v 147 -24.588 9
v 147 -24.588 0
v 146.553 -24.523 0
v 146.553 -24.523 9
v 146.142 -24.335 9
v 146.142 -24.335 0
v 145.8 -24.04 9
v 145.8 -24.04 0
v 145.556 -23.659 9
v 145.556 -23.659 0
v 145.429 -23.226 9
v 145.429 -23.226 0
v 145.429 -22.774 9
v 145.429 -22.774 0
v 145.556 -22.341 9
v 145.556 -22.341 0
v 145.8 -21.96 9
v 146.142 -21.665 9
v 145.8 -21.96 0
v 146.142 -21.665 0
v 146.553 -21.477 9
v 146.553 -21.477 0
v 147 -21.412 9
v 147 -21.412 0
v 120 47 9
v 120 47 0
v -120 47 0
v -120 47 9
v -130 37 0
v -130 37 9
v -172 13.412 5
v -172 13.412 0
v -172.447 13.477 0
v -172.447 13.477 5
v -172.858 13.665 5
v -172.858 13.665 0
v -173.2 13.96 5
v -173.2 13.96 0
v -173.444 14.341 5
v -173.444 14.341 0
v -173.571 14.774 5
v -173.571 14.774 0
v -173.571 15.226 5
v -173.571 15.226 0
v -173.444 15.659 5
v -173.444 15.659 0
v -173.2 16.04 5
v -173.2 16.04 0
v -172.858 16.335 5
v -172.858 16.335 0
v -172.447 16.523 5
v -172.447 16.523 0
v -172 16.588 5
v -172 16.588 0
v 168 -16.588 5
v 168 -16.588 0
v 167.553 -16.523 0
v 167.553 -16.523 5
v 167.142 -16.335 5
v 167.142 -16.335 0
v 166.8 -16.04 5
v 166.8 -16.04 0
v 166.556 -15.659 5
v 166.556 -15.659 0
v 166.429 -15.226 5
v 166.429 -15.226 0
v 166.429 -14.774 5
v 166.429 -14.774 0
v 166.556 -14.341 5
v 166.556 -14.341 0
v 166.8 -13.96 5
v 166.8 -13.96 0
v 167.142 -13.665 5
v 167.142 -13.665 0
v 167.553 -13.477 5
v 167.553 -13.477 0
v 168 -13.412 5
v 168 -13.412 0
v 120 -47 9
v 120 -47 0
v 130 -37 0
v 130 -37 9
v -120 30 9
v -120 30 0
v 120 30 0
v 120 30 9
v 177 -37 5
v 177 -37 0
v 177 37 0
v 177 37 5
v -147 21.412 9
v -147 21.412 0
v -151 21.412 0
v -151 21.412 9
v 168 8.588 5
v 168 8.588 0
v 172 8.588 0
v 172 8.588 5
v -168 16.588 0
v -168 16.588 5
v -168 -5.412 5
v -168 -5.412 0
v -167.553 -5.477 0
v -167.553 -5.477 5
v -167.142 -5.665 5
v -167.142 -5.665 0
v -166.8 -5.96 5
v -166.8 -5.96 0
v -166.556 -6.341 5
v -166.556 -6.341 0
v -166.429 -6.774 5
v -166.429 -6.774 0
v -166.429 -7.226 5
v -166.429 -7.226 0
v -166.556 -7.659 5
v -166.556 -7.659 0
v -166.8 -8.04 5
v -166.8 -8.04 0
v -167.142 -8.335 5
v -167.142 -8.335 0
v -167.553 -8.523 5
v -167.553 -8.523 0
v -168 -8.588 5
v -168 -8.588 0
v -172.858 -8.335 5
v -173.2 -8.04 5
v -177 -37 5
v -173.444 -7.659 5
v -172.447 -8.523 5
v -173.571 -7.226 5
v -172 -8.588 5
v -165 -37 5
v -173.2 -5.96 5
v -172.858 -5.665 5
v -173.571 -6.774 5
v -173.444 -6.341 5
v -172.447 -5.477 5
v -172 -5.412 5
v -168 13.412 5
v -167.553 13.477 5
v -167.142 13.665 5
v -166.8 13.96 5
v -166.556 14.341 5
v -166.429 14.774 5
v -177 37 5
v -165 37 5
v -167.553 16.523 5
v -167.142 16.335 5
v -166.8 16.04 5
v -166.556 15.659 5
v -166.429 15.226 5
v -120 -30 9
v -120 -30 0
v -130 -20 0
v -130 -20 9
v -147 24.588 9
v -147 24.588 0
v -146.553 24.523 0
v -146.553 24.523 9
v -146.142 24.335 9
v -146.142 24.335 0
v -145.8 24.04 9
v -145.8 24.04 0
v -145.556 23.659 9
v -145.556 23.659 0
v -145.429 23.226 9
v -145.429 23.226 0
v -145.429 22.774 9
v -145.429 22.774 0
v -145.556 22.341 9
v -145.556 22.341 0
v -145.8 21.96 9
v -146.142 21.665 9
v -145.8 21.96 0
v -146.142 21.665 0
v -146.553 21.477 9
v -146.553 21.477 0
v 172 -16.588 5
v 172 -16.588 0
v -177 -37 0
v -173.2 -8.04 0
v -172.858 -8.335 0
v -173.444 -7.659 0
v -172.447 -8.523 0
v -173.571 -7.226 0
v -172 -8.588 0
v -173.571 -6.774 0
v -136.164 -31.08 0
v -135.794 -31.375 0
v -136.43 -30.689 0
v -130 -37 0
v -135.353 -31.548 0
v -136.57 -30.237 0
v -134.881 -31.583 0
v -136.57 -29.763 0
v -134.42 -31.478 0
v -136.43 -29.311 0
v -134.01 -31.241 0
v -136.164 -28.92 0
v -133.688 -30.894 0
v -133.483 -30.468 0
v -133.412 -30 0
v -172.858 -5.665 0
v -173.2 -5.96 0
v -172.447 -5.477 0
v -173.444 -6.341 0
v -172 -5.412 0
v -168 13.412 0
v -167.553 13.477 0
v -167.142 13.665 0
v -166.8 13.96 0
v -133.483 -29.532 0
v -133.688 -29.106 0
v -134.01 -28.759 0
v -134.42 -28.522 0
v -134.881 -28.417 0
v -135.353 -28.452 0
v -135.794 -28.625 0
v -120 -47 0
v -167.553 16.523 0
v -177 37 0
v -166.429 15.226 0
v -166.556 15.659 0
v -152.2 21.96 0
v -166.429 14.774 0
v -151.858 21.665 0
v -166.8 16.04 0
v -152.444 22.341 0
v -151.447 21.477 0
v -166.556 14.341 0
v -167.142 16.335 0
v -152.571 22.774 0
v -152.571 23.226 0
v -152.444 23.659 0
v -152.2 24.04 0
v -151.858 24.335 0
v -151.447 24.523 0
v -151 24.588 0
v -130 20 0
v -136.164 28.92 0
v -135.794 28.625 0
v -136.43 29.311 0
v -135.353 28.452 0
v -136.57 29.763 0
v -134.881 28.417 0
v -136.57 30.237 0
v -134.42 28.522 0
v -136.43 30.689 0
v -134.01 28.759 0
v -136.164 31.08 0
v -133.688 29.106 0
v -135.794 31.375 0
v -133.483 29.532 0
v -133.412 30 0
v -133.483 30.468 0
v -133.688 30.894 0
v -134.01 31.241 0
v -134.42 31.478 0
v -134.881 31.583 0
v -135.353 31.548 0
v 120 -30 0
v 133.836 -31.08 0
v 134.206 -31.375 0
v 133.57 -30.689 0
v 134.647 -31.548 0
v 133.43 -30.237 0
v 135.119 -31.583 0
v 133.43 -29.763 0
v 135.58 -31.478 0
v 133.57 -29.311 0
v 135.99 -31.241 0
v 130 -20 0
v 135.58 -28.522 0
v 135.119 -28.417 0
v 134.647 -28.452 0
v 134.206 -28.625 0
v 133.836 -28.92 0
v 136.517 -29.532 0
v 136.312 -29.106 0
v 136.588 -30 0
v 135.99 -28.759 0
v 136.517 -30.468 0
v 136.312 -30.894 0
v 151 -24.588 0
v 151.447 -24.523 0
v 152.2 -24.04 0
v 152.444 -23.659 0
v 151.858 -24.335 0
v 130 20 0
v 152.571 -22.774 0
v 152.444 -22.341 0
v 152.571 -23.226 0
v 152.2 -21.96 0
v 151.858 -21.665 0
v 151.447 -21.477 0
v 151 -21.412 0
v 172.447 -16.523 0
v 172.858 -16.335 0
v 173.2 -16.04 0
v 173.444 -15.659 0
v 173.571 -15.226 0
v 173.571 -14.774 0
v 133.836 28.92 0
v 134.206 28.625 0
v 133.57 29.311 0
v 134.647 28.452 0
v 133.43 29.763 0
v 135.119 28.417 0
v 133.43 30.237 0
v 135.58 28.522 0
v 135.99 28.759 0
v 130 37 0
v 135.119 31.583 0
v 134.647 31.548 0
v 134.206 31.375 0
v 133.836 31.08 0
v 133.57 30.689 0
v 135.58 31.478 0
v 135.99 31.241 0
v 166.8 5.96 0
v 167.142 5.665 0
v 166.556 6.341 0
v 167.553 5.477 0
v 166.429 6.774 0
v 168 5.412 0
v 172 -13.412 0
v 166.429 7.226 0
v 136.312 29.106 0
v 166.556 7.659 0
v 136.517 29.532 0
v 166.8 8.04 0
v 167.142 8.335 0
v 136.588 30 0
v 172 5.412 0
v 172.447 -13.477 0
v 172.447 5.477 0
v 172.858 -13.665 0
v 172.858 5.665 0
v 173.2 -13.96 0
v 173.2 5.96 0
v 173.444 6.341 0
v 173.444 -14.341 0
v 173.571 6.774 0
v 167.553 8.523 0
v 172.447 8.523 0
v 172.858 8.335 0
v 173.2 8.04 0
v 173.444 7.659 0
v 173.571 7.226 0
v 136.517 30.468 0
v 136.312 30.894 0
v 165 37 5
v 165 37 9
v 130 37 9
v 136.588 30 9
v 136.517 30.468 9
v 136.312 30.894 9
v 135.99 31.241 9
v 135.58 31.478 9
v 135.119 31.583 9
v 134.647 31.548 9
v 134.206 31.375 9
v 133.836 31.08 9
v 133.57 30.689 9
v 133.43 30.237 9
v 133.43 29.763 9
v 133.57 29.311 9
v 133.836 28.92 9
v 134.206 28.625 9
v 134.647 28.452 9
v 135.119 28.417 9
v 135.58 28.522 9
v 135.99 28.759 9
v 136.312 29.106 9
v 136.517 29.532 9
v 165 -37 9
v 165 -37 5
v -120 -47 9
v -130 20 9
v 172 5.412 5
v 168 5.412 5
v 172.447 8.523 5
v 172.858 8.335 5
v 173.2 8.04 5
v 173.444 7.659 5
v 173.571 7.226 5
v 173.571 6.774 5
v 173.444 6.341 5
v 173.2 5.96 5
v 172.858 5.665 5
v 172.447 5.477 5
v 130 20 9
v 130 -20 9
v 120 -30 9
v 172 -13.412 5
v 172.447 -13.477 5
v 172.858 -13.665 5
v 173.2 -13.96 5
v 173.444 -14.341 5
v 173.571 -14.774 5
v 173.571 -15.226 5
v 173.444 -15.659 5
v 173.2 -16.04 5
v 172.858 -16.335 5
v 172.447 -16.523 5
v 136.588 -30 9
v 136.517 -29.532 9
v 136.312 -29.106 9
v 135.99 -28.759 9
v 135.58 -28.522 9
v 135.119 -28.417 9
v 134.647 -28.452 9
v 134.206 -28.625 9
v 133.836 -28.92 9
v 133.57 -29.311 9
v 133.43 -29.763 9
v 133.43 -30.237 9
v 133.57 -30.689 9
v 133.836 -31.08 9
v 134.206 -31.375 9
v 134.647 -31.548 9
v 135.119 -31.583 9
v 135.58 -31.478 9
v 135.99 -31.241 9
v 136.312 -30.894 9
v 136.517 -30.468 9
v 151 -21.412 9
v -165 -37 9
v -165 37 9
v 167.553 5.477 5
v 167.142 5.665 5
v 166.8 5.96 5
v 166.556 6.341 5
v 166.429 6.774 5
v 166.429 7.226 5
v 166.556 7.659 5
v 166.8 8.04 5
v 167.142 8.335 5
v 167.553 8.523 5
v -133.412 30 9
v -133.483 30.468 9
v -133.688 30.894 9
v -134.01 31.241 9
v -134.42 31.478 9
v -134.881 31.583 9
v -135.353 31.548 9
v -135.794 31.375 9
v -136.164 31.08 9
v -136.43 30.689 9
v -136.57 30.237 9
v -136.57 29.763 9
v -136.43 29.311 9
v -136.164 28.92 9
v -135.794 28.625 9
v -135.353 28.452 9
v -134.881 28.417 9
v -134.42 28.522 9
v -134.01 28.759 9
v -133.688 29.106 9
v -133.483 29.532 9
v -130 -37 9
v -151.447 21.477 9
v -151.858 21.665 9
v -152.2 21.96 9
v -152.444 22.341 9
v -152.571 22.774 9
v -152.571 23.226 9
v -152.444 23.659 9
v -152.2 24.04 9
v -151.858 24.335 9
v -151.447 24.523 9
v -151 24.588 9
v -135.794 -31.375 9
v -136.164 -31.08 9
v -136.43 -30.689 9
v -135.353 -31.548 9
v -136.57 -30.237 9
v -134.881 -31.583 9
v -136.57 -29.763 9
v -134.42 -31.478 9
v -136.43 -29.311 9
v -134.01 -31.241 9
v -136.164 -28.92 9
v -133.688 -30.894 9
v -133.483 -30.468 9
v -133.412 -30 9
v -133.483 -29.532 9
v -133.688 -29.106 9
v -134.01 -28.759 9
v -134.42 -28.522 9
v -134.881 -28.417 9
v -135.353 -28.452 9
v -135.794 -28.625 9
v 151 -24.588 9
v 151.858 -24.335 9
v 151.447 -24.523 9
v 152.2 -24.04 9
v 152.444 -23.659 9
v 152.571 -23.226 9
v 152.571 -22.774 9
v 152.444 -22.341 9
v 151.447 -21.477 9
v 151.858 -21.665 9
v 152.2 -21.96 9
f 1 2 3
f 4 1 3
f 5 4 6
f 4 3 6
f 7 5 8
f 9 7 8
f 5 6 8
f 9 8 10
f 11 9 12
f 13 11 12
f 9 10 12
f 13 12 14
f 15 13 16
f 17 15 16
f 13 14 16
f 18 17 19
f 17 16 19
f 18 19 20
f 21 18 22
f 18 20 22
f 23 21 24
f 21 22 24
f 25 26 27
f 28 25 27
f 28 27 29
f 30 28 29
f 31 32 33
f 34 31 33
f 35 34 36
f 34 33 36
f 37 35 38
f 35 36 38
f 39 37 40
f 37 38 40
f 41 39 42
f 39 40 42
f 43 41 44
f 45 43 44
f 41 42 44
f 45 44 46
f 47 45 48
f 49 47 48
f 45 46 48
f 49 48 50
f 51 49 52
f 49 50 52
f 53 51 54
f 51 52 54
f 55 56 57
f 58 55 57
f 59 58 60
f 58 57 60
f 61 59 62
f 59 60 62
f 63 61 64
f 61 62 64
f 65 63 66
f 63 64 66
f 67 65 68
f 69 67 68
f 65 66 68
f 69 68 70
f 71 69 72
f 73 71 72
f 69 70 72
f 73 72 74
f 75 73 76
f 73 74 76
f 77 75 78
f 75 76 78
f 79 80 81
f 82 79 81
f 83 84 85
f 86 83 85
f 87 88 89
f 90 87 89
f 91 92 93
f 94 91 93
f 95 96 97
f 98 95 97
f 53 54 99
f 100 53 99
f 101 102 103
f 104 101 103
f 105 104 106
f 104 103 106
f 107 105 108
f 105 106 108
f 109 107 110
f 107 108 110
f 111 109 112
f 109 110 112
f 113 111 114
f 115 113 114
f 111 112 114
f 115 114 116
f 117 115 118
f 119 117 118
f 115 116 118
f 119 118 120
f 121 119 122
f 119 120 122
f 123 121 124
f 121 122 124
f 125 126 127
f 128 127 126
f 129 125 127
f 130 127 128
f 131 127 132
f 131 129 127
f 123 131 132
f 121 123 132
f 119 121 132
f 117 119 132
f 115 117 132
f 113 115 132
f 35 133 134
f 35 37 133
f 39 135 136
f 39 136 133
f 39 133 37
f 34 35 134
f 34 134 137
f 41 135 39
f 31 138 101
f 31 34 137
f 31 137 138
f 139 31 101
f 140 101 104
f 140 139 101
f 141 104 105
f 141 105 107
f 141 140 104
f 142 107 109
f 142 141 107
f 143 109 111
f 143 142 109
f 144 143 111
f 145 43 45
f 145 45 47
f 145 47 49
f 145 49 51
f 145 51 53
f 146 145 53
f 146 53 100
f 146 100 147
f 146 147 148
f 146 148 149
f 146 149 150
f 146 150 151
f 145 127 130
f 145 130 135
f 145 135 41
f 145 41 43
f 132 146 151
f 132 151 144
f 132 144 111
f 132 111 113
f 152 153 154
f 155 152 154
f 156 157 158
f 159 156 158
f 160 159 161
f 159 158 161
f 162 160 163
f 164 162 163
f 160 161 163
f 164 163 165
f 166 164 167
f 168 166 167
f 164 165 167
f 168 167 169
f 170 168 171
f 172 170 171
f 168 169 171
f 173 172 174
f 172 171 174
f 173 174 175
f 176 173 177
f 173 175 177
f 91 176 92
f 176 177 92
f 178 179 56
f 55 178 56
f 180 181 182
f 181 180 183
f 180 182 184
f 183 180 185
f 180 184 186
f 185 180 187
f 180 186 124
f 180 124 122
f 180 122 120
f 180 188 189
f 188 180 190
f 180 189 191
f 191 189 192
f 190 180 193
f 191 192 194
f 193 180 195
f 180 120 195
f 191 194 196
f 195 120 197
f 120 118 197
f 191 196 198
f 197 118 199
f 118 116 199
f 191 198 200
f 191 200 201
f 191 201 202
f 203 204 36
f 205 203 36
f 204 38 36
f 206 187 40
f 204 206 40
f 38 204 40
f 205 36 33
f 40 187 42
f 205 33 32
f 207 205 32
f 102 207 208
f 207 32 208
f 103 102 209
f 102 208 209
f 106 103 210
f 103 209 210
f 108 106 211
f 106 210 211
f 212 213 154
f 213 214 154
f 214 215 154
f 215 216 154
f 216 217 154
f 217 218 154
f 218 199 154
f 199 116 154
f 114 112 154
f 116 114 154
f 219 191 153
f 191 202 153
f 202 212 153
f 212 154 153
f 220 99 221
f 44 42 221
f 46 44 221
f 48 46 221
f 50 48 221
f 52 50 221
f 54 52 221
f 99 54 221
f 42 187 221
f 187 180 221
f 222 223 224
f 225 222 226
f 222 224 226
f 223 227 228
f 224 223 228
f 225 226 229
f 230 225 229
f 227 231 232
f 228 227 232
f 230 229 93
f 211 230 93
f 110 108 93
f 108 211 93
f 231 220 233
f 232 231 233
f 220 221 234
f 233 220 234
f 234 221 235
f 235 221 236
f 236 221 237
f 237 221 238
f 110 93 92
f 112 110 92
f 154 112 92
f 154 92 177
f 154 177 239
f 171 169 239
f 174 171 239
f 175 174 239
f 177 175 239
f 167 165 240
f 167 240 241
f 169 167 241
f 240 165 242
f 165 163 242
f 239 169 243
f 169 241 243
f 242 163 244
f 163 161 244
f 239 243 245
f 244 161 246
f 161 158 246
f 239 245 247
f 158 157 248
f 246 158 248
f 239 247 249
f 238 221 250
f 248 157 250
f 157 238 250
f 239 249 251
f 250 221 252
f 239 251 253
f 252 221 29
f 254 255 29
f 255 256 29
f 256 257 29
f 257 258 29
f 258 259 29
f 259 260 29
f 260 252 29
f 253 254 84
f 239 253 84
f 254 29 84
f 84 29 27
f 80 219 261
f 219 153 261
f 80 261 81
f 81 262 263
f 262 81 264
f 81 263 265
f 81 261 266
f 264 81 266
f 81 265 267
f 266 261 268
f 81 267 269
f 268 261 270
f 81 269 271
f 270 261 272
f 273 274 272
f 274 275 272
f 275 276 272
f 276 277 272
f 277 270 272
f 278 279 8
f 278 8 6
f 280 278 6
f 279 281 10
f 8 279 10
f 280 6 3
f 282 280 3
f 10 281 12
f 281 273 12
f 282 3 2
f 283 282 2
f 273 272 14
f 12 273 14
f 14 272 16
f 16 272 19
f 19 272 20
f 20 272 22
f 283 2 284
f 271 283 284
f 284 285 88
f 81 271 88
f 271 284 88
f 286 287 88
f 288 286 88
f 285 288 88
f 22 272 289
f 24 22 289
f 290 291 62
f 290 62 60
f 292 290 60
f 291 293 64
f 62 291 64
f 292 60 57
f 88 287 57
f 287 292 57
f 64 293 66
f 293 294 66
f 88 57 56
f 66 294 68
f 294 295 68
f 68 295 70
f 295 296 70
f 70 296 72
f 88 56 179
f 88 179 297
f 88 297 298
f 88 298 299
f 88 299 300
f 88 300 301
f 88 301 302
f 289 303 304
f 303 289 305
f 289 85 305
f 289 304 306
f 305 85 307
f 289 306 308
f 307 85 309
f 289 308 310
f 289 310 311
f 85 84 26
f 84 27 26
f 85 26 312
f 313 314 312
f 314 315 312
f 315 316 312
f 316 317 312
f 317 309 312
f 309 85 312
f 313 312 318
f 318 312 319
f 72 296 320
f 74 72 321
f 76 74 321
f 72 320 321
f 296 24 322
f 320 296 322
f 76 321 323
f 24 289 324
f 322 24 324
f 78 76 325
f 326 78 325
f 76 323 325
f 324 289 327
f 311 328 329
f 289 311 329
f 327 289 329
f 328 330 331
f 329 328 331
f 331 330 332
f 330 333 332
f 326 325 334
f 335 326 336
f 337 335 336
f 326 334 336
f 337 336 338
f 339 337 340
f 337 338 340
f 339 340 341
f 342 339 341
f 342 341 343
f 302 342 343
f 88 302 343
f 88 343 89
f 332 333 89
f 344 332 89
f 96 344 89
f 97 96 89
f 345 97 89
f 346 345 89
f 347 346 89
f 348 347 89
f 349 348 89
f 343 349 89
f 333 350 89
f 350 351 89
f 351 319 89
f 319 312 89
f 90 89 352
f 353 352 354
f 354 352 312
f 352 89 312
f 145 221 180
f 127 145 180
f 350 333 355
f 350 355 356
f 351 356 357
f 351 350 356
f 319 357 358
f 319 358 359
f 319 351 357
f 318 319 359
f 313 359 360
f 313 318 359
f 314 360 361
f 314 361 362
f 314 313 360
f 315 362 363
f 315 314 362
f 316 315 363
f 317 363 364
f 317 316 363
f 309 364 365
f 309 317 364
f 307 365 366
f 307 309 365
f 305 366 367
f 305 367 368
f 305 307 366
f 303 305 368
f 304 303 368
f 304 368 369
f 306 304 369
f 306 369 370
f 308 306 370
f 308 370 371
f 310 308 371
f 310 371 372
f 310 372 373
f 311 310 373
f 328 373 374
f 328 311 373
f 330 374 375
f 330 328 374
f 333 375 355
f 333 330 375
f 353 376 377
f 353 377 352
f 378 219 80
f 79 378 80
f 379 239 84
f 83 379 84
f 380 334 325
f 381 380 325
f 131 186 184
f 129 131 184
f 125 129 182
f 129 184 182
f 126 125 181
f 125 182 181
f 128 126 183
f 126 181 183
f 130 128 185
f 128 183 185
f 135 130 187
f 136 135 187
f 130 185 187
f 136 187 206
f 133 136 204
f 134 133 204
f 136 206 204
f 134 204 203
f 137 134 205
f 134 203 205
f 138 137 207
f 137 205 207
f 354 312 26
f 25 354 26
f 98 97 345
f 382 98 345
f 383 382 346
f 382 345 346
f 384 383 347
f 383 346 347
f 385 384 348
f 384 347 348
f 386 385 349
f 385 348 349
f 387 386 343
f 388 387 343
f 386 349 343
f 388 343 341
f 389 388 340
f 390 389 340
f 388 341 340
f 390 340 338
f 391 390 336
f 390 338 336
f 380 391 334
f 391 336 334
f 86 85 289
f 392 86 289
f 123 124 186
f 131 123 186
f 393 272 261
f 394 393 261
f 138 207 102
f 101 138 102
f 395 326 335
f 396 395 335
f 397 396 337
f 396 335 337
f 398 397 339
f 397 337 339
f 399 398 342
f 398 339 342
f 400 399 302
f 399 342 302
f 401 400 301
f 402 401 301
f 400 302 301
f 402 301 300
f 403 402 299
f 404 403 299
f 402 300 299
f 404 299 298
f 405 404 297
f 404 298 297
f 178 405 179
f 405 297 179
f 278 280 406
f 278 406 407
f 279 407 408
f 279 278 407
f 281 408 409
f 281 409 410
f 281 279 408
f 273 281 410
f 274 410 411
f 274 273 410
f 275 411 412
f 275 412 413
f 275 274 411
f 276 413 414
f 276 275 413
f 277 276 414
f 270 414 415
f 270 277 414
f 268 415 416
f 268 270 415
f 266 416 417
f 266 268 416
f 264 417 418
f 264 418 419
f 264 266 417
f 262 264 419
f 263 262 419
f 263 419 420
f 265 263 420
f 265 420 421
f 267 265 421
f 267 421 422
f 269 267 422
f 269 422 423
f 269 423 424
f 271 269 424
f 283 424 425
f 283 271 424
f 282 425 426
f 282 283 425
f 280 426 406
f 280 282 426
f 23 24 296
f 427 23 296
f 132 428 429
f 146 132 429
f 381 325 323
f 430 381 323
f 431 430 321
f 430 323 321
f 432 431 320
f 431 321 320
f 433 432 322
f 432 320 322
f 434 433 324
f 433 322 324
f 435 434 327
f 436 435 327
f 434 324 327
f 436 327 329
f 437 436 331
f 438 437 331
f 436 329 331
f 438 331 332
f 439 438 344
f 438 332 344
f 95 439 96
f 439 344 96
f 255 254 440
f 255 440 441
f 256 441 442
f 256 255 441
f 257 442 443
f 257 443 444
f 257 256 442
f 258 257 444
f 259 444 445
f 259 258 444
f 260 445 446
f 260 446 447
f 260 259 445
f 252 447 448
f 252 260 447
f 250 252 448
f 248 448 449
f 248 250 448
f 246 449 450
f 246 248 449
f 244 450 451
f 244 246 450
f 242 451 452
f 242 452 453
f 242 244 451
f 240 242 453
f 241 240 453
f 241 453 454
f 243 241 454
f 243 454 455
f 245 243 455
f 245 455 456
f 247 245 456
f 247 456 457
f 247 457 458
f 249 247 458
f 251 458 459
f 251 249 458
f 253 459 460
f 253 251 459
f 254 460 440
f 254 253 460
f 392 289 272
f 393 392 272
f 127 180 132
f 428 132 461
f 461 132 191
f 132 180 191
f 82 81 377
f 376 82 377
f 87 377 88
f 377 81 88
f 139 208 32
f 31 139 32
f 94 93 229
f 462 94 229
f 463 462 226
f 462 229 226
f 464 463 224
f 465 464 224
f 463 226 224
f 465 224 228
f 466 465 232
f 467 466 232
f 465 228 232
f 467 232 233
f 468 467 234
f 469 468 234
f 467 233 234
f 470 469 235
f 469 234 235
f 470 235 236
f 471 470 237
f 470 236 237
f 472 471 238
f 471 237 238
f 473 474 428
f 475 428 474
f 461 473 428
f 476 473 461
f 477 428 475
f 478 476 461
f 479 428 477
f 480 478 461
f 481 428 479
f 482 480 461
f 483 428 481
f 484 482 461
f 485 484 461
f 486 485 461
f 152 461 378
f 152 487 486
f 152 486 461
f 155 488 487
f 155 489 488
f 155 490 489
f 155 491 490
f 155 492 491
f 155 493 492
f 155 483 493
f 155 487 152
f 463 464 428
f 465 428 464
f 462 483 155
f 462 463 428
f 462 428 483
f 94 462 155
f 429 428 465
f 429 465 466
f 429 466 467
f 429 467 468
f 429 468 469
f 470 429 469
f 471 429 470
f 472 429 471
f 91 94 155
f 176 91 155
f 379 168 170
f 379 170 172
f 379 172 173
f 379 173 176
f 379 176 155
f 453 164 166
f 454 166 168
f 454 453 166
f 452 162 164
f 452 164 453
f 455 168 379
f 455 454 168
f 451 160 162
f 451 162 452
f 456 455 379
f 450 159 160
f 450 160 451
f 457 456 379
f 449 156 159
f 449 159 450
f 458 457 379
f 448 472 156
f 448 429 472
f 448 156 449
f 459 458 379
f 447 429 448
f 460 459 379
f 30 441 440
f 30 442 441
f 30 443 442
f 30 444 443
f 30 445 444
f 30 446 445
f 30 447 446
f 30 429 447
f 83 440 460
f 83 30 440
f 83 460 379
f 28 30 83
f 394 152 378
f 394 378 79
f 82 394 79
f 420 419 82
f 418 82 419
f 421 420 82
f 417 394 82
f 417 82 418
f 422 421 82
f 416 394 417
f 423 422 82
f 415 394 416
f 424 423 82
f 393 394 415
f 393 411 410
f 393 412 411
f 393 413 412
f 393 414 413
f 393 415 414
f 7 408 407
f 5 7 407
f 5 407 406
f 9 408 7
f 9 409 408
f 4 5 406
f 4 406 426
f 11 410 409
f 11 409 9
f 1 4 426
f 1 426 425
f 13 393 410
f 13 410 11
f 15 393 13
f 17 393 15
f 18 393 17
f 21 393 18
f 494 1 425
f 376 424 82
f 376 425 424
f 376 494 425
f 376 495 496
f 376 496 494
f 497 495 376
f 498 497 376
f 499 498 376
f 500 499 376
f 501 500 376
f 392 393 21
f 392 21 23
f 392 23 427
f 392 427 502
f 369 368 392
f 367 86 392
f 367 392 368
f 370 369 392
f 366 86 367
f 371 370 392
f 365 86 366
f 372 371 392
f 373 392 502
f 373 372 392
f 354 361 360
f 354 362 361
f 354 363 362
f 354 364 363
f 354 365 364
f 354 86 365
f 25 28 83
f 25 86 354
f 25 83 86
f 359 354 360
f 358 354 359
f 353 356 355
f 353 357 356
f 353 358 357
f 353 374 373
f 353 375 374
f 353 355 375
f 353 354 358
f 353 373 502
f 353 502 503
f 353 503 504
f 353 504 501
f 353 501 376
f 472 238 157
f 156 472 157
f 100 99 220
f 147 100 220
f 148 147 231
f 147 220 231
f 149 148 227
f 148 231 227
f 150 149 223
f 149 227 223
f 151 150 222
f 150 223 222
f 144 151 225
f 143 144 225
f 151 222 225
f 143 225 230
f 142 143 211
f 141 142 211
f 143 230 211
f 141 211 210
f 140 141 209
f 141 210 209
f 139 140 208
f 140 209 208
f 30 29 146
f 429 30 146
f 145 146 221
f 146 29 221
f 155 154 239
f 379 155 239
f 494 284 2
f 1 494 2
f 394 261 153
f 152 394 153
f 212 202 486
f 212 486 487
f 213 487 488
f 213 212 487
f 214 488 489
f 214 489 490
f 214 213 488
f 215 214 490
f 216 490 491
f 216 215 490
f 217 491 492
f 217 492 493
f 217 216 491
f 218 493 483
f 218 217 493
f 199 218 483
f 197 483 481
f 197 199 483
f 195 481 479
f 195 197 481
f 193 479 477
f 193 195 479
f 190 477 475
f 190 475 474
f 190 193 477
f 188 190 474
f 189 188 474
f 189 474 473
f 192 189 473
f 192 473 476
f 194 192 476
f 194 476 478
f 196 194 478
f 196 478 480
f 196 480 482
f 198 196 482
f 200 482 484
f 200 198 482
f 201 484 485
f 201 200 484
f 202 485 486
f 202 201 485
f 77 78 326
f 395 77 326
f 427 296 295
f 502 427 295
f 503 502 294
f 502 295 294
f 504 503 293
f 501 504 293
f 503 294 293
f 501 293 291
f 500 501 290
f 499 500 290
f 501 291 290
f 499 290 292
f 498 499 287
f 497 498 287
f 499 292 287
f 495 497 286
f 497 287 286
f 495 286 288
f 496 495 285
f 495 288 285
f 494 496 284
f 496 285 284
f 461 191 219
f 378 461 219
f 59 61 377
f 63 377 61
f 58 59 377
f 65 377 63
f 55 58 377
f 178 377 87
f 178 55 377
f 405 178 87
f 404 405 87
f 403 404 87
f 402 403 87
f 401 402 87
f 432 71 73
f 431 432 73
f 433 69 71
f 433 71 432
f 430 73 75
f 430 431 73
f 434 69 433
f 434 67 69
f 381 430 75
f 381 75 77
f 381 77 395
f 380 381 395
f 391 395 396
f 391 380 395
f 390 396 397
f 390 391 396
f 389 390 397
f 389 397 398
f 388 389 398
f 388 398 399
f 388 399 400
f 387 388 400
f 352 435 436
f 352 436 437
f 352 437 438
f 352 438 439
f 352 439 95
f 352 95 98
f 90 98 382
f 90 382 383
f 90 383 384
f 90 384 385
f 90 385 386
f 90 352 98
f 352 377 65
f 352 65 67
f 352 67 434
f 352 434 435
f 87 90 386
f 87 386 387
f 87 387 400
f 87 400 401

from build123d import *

# Parameters (mm, degrees)
F0_R     = 1.5875
F1_DEPTH = 9
F3_W     = 12
F3_H     = 74
F4_DEPTH = 4


with BuildPart() as f1:
    # F0 (on Top) → F1 (new body)
    with BuildSketch(Plane.XY):
        Polygon((177, -37), (177, 37), (130, 37), (120, 47), (-120, 47), (-130, 37), (-177, 37), (-177, -37), (-130, -37), (-120, -47), (120, -47), (130, -37), align=None)
        with Locations((-135, -30)):
            Circle(F0_R, mode=Mode.SUBTRACT)
        with BuildLine():
            Line((-168, -8.5875), (-172, -8.5875))
            ThreePointArc((-172, -8.5875), (-173.5875, -7), (-172, -5.4125))
            Line((-172, -5.4125), (-168, -5.4125))
            ThreePointArc((-168, -5.4125), (-166.4125, -7), (-168, -8.5875))
        make_face(mode=Mode.SUBTRACT)
        with Locations((135, -30)):
            Circle(F0_R, mode=Mode.SUBTRACT)
        with BuildLine():
            Line((147, -21.4125), (151, -21.4125))
            ThreePointArc((151, -21.4125), (152.5875, -23), (151, -24.5875))
            Line((151, -24.5875), (147, -24.5875))
            ThreePointArc((147, -24.5875), (145.4125, -23), (147, -21.4125))
        make_face(mode=Mode.SUBTRACT)
        with BuildLine():
            Line((168, -13.4125), (172, -13.4125))
            ThreePointArc((172, -13.4125), (173.5875, -15), (172, -16.5875))
            Line((172, -16.5875), (168, -16.5875))
            ThreePointArc((168, -16.5875), (166.4125, -15), (168, -13.4125))
        make_face(mode=Mode.SUBTRACT)
        with BuildLine():
            Line((-168, 13.4125), (-172, 13.4125))
            ThreePointArc((-172, 13.4125), (-173.5875, 15), (-172, 16.5875))
            Line((-172, 16.5875), (-168, 16.5875))
            ThreePointArc((-168, 16.5875), (-166.4125, 15), (-168, 13.4125))
        make_face(mode=Mode.SUBTRACT)
        with BuildLine():
            Line((-147, 21.4125), (-151, 21.4125))
            ThreePointArc((-151, 21.4125), (-152.5875, 23), (-151, 24.5875))
            Line((-151, 24.5875), (-147, 24.5875))
            ThreePointArc((-147, 24.5875), (-145.4125, 23), (-147, 21.4125))
        make_face(mode=Mode.SUBTRACT)
        with Locations((-135, 30)):
            Circle(F0_R, mode=Mode.SUBTRACT)
        Polygon((120, 30), (130, 20), (130, -20), (120, -30), (-120, -30), (-130, -20), (-130, 20), (-120, 30), align=None, mode=Mode.SUBTRACT)
        with BuildLine():
            Line((168, 8.5875), (172, 8.5875))
            ThreePointArc((172, 8.5875), (173.5875, 7), (172, 5.4125))
            Line((172, 5.4125), (168, 5.4125))
            ThreePointArc((168, 5.4125), (166.4125, 7), (168, 8.5875))
        make_face(mode=Mode.SUBTRACT)
        with Locations((135, 30)):
            Circle(F0_R, mode=Mode.SUBTRACT)
    extrude(amount=F1_DEPTH)

    # F3 (on face) → F4 (cut)
    with BuildSketch(Plane.XY.offset(9)):
        with Locations((-171, 0)):
            Rectangle(F3_W, F3_H)
        with BuildLine():
            ThreePointArc((-168, -5.4125), (-166.4125, -7), (-168, -8.5875))
            Line((-168, -8.5875), (-172, -8.5875))
            ThreePointArc((-172, -8.5875), (-173.5875, -7), (-172, -5.4125))
            Line((-172, -5.4125), (-168, -5.4125))
        make_face(mode=Mode.SUBTRACT)
        with BuildLine():
            ThreePointArc((-168, 16.5875), (-166.4125, 15), (-168, 13.4125))
            Line((-168, 13.4125), (-172, 13.4125))
            ThreePointArc((-172, 13.4125), (-173.5875, 15), (-172, 16.5875))
            Line((-172, 16.5875), (-168, 16.5875))
        make_face(mode=Mode.SUBTRACT)
        with Locations((171, 0)):
            Rectangle(F3_W, F3_H)
        with BuildLine():
            ThreePointArc((168, -16.5875), (166.4125, -15), (168, -13.4125))
            Line((168, -13.4125), (172, -13.4125))
            ThreePointArc((172, -13.4125), (173.5875, -15), (172, -16.5875))
            Line((172, -16.5875), (168, -16.5875))
        make_face(mode=Mode.SUBTRACT)
        with BuildLine():
            ThreePointArc((168, 5.4125), (166.4125, 7), (168, 8.5875))
            Line((168, 8.5875), (172, 8.5875))
            ThreePointArc((172, 8.5875), (173.5875, 7), (172, 5.4125))
            Line((172, 5.4125), (168, 5.4125))
        make_face(mode=Mode.SUBTRACT)
    extrude(amount=-F4_DEPTH, mode=Mode.SUBTRACT)


solid = f1.part
